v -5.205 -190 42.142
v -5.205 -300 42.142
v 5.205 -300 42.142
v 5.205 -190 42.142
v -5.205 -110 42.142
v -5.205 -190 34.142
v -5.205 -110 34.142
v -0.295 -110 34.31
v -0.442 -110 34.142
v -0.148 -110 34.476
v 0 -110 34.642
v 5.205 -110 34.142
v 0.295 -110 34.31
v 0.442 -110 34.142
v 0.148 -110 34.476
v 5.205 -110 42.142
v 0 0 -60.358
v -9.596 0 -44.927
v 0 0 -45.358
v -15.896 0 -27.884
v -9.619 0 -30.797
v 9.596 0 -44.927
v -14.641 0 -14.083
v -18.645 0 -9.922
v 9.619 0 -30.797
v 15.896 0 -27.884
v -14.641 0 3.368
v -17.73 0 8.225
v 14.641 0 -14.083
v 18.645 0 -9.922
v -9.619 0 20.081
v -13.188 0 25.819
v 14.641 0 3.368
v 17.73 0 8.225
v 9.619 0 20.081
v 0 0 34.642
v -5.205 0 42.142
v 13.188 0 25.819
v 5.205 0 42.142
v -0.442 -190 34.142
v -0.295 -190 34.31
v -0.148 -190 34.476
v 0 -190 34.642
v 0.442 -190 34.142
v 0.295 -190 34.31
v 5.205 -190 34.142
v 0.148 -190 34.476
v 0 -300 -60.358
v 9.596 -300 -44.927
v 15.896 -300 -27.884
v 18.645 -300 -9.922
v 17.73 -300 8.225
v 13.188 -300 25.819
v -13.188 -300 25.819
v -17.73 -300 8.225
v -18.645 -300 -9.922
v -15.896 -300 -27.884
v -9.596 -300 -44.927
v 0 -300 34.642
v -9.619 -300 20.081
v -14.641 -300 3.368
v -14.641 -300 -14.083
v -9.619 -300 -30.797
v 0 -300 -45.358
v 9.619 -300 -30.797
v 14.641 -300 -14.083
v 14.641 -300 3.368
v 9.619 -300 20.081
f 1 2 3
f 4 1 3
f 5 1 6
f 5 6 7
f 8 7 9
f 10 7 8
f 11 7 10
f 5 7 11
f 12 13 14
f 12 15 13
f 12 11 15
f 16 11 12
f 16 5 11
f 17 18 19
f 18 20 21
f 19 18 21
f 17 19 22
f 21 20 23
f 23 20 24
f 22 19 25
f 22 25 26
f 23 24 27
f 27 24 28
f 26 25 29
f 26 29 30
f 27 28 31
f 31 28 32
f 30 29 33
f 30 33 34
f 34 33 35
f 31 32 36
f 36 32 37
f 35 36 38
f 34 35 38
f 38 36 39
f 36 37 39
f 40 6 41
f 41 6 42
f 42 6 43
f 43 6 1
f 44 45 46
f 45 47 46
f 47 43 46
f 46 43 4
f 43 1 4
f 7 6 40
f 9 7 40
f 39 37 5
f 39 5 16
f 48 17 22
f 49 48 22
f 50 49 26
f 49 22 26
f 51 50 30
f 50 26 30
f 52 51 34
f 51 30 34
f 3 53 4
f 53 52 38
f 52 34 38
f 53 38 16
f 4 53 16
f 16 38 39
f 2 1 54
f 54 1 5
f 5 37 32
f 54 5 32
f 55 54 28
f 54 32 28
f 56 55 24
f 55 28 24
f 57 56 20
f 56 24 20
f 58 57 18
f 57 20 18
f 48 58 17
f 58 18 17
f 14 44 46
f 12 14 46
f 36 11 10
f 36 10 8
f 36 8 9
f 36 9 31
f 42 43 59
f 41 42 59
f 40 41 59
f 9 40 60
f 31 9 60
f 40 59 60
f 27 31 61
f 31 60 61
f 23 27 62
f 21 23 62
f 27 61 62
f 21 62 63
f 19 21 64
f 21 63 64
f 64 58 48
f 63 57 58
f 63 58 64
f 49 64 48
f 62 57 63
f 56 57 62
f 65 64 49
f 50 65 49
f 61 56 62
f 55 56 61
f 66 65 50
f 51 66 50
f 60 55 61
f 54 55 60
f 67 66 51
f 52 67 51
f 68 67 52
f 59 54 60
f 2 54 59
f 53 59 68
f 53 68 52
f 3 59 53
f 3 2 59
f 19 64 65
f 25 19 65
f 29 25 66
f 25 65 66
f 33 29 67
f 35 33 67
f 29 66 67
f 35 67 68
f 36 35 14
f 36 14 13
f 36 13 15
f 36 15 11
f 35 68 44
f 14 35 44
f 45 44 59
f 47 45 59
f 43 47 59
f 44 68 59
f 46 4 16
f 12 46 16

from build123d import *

# Parameters (mm, degrees)
F1_DEPTH = 300
F3_DEPTH = 300
F4_W     = 73.538634
F4_H     = 45.165462
F5_DEPTH = 300
F6_W     = 10.41078
F6_H     = 80
F7_DEPTH = 8


with BuildPart() as f1:
    # F0 (on Front) → F1 (new body)
    with BuildSketch(Plane.XZ):
        with BuildLine():
            ThreePointArc((0, 49.64232), (-18.760966, -5.35768), (0, -60.35768))
            ThreePointArc((0, -60.35768), (18.760966, -5.35768), (0, 49.64232))
        make_face()
    extrude(amount=F1_DEPTH)

    # F2 (on face) → F3 (cut)
    with BuildSketch(Plane.XZ.offset(300)):
        with BuildLine():
            ThreePointArc((0, 34.64232), (-15.27864, -5.35768), (0, -45.35768))
            ThreePointArc((0, -45.35768), (15.27864, -5.35768), (0, 34.64232))
        make_face()
    extrude(amount=-F3_DEPTH, mode=Mode.SUBTRACT)

    # F4 (on face) → F5 (cut)
    with BuildSketch(Plane.XZ.offset(300)):
        with Locations((-1.304593, 64.725051)):
            Rectangle(F4_W, F4_H)
    extrude(amount=-F5_DEPTH, mode=Mode.SUBTRACT)

    # F6 (on face) → F7 (cut)
    with BuildSketch(Plane.XY.offset(42.14232)):
        with Locations((0, -150)):
            Rectangle(F6_W, F6_H)
    extrude(amount=-F7_DEPTH, mode=Mode.SUBTRACT)


solid = f1.part
